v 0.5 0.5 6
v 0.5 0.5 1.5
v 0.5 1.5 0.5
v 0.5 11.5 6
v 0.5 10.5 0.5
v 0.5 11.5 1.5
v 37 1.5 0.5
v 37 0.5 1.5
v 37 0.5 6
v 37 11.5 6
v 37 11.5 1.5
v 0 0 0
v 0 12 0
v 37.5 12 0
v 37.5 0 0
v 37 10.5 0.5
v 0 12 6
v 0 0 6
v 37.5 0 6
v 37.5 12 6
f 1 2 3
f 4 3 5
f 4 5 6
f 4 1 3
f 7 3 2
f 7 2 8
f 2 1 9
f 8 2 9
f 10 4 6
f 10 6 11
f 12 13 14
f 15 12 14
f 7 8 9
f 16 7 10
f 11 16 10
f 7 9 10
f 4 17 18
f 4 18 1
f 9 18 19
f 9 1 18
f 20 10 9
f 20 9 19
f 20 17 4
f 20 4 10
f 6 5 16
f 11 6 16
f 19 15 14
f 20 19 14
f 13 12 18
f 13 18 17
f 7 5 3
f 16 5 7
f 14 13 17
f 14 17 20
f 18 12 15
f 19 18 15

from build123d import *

# Parameters (mm, degrees)
F0_W     = 37.5
F0_H     = 12
F1_DEPTH = 6
F2_W     = 36.5
F2_H     = 11
F3_DEPTH = 5.5
F4_SIZE  = 1


with BuildPart() as f1:
    # F0 (on Top) → F1 (new body)
    with BuildSketch(Plane.XY):
        with Locations((18.75, 6)):
            Rectangle(F0_W, F0_H)
    extrude(amount=F1_DEPTH)

    # F2 (on face) → F3 (cut)
    with BuildSketch(Plane.XY.offset(6)):
        with Locations((18.75, 6)):
            Rectangle(F2_W, F2_H)
    extrude(amount=-F3_DEPTH, mode=Mode.SUBTRACT)

    # F4
    f4_edges = [f1.edges().sort_by_distance(p)[0] for p in [
        (18.75, 11.5, 0.5),
        (18.75, 0.5, 0.5),
    ]]
    chamfer(f4_edges, length=F4_SIZE)


solid = f1.part
